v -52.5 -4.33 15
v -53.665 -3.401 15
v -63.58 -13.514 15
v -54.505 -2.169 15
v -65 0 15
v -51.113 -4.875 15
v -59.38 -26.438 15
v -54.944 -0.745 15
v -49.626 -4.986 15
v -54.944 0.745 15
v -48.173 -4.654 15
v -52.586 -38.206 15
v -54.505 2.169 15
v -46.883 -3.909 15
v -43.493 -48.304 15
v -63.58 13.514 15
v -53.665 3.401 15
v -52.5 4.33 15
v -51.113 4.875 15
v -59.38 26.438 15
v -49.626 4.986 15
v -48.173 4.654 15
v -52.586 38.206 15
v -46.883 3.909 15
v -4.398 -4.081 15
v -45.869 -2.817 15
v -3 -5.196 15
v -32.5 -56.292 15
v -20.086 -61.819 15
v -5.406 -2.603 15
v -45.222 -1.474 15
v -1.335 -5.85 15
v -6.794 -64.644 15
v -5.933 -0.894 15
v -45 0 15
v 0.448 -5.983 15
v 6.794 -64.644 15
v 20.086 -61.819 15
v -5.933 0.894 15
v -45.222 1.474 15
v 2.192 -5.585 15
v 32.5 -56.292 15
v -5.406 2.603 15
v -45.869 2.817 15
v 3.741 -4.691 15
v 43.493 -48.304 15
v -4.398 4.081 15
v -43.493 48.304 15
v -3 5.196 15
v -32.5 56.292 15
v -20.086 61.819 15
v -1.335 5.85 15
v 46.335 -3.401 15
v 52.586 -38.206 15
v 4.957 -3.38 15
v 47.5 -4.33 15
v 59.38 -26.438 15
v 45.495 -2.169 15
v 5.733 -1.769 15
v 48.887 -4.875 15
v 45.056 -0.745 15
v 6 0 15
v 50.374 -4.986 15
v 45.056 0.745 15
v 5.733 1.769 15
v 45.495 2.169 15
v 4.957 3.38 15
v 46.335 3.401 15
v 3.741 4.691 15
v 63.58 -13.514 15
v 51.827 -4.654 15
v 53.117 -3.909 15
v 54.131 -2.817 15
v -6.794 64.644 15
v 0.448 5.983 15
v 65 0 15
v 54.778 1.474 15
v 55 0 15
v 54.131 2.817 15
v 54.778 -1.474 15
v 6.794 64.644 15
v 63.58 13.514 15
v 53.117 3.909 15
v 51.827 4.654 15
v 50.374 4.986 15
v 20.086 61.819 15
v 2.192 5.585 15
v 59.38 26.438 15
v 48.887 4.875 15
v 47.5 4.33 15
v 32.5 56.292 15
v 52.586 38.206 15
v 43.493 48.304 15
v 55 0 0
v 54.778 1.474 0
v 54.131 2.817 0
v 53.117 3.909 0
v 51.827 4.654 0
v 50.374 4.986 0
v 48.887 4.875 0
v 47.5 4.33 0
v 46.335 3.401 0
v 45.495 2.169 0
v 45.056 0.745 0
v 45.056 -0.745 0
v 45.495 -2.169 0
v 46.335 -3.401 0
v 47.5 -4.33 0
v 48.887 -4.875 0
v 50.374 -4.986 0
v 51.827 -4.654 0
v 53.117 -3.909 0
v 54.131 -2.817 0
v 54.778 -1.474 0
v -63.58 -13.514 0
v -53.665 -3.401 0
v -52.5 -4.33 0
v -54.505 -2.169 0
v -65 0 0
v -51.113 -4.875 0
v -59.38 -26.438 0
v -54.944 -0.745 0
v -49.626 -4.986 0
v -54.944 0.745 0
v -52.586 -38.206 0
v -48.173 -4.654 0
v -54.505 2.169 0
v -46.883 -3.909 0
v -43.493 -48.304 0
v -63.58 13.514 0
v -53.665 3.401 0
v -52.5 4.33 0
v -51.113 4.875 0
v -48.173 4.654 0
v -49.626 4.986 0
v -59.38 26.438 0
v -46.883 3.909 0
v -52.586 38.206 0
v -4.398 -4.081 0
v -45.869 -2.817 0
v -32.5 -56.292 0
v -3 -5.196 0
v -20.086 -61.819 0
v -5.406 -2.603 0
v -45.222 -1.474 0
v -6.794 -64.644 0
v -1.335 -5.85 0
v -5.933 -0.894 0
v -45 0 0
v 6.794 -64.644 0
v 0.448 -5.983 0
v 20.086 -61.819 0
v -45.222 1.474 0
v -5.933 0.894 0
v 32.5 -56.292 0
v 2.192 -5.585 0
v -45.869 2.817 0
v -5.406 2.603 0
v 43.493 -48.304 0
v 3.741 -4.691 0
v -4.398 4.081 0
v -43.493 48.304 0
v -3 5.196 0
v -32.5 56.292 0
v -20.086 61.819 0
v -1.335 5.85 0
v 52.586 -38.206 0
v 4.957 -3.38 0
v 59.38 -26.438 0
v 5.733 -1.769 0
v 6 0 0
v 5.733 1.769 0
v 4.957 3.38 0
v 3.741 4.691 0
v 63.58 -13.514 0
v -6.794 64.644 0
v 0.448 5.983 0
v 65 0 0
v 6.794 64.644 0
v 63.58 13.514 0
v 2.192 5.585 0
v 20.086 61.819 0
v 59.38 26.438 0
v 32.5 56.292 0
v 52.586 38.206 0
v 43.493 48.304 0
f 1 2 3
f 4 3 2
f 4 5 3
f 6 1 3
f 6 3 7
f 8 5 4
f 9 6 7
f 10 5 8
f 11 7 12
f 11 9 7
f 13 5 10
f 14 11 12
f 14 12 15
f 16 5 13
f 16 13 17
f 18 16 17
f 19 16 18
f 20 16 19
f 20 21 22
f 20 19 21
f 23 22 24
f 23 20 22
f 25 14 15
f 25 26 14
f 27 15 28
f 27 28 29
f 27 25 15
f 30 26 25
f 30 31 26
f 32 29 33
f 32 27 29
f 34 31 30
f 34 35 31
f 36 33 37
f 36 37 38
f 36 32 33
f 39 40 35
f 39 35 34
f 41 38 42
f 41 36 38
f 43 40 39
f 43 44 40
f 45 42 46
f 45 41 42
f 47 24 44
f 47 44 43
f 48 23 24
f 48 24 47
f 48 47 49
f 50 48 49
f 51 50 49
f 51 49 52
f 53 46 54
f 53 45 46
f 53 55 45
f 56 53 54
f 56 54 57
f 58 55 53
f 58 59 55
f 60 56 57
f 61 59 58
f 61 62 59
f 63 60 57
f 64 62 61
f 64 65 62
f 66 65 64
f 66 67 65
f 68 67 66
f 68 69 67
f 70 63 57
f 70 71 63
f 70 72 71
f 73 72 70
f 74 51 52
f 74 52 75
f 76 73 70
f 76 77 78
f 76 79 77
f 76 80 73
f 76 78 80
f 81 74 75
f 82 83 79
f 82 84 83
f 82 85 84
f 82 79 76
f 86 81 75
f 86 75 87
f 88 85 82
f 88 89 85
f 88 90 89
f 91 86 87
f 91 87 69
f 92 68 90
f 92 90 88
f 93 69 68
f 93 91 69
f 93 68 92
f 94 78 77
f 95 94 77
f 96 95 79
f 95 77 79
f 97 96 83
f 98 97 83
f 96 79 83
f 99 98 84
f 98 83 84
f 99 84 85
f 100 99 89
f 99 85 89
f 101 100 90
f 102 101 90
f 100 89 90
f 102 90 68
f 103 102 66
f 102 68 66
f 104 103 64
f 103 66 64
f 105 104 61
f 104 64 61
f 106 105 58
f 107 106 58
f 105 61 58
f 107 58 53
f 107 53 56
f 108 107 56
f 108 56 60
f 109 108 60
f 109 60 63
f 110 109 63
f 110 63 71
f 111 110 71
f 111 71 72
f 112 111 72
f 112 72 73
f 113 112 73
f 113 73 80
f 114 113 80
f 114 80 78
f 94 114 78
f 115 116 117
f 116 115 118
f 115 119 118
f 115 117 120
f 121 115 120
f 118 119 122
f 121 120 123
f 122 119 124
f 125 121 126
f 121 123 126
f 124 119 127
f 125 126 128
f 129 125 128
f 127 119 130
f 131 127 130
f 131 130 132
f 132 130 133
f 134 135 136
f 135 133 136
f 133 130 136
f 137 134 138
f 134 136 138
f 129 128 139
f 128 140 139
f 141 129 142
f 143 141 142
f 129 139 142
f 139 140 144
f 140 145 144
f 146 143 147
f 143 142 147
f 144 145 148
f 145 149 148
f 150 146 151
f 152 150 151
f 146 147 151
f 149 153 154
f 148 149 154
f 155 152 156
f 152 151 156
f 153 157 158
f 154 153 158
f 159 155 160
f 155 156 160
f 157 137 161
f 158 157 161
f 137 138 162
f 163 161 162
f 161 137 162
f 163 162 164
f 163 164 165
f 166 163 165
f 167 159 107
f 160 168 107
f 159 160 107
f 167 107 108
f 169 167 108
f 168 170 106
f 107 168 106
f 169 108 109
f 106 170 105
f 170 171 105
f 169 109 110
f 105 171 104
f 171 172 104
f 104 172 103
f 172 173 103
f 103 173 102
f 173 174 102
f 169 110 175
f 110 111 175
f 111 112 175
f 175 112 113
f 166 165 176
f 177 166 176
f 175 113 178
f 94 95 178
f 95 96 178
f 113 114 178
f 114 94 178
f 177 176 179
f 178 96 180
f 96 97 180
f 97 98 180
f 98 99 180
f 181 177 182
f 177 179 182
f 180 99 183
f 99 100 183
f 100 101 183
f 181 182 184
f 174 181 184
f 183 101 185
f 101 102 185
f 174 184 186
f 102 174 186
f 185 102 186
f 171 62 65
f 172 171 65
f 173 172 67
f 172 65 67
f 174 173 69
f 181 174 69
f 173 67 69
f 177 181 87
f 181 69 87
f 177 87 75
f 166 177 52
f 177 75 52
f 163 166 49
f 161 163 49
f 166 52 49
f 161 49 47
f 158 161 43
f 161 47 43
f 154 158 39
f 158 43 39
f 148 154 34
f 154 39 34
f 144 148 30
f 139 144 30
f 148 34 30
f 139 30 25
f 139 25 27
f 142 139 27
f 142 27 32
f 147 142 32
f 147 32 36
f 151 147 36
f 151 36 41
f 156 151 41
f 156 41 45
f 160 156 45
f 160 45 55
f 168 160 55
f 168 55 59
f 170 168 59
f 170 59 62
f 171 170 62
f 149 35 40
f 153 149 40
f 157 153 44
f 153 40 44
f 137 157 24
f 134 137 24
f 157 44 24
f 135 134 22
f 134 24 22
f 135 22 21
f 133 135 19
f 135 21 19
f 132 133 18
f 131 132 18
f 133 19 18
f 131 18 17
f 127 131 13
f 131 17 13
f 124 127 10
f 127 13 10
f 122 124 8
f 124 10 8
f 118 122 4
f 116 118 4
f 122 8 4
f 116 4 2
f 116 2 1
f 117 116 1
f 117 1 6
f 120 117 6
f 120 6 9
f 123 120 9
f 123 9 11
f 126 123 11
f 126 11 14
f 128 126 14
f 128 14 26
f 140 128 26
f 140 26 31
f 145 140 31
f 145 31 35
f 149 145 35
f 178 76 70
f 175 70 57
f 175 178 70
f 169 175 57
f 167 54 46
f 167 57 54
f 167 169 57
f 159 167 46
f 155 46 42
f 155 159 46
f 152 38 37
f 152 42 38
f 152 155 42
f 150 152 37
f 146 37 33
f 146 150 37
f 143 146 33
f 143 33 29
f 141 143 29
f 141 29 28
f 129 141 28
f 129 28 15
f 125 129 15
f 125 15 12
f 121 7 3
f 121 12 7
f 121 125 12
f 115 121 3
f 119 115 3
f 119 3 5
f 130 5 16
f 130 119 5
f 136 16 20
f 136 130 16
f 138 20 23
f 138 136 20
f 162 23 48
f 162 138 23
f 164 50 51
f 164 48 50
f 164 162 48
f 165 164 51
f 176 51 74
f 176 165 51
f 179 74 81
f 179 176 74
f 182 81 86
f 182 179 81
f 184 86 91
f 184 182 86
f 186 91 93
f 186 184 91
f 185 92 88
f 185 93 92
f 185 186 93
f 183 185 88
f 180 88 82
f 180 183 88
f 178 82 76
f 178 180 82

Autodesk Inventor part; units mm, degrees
ref_plane "YZ Plane" through (0, 0, 0) normal (1, 0, 0) x (0, 1, 0)
ref_plane "XZ Plane" through (0, 0, 0) normal (0, 1, 0) x (-1, 0, 0)
ref_plane "XY Plane" through (0, 0, 0) normal (0, 0, 1) x (1, 0, 0)
sketch "Sketch1" plane through (0, 0, 0) normal (0, 0, 1) x (1, 0, 0)
  circle A0 centre (0, 0) radius 65
  circle A1 centre (0, 0) radius 6
  dimension "d0" = 130
  dimension "d3" = 12
extrude "Extrusion1" add sketch "Sketch1" along normal blind 15 contours A0 | A1
sketch "Sketch2" plane through (0, 0, 15) normal (0, 0, 1) x (1, 0, 0)
  circle A0 centre (0, 0) radius 6
  dimension "d4" = 12
extrude "Extrusion2" cut sketch "Sketch2" against normal blind 15
sketch "Sketch3" plane through (0, 0, 15) normal (0, 0, 1) x (1, 0, 0)
  circle A0 centre (50, 0) radius 5
  circle A1 centre (-50, 0) radius 5
  point P0 (0, 0)
  dimension "d7" = 10
  dimension "d8" = 10
extrude "Extrusion3" cut sketch "Sketch3" against normal blind 15
properties part number "doner_taban"
